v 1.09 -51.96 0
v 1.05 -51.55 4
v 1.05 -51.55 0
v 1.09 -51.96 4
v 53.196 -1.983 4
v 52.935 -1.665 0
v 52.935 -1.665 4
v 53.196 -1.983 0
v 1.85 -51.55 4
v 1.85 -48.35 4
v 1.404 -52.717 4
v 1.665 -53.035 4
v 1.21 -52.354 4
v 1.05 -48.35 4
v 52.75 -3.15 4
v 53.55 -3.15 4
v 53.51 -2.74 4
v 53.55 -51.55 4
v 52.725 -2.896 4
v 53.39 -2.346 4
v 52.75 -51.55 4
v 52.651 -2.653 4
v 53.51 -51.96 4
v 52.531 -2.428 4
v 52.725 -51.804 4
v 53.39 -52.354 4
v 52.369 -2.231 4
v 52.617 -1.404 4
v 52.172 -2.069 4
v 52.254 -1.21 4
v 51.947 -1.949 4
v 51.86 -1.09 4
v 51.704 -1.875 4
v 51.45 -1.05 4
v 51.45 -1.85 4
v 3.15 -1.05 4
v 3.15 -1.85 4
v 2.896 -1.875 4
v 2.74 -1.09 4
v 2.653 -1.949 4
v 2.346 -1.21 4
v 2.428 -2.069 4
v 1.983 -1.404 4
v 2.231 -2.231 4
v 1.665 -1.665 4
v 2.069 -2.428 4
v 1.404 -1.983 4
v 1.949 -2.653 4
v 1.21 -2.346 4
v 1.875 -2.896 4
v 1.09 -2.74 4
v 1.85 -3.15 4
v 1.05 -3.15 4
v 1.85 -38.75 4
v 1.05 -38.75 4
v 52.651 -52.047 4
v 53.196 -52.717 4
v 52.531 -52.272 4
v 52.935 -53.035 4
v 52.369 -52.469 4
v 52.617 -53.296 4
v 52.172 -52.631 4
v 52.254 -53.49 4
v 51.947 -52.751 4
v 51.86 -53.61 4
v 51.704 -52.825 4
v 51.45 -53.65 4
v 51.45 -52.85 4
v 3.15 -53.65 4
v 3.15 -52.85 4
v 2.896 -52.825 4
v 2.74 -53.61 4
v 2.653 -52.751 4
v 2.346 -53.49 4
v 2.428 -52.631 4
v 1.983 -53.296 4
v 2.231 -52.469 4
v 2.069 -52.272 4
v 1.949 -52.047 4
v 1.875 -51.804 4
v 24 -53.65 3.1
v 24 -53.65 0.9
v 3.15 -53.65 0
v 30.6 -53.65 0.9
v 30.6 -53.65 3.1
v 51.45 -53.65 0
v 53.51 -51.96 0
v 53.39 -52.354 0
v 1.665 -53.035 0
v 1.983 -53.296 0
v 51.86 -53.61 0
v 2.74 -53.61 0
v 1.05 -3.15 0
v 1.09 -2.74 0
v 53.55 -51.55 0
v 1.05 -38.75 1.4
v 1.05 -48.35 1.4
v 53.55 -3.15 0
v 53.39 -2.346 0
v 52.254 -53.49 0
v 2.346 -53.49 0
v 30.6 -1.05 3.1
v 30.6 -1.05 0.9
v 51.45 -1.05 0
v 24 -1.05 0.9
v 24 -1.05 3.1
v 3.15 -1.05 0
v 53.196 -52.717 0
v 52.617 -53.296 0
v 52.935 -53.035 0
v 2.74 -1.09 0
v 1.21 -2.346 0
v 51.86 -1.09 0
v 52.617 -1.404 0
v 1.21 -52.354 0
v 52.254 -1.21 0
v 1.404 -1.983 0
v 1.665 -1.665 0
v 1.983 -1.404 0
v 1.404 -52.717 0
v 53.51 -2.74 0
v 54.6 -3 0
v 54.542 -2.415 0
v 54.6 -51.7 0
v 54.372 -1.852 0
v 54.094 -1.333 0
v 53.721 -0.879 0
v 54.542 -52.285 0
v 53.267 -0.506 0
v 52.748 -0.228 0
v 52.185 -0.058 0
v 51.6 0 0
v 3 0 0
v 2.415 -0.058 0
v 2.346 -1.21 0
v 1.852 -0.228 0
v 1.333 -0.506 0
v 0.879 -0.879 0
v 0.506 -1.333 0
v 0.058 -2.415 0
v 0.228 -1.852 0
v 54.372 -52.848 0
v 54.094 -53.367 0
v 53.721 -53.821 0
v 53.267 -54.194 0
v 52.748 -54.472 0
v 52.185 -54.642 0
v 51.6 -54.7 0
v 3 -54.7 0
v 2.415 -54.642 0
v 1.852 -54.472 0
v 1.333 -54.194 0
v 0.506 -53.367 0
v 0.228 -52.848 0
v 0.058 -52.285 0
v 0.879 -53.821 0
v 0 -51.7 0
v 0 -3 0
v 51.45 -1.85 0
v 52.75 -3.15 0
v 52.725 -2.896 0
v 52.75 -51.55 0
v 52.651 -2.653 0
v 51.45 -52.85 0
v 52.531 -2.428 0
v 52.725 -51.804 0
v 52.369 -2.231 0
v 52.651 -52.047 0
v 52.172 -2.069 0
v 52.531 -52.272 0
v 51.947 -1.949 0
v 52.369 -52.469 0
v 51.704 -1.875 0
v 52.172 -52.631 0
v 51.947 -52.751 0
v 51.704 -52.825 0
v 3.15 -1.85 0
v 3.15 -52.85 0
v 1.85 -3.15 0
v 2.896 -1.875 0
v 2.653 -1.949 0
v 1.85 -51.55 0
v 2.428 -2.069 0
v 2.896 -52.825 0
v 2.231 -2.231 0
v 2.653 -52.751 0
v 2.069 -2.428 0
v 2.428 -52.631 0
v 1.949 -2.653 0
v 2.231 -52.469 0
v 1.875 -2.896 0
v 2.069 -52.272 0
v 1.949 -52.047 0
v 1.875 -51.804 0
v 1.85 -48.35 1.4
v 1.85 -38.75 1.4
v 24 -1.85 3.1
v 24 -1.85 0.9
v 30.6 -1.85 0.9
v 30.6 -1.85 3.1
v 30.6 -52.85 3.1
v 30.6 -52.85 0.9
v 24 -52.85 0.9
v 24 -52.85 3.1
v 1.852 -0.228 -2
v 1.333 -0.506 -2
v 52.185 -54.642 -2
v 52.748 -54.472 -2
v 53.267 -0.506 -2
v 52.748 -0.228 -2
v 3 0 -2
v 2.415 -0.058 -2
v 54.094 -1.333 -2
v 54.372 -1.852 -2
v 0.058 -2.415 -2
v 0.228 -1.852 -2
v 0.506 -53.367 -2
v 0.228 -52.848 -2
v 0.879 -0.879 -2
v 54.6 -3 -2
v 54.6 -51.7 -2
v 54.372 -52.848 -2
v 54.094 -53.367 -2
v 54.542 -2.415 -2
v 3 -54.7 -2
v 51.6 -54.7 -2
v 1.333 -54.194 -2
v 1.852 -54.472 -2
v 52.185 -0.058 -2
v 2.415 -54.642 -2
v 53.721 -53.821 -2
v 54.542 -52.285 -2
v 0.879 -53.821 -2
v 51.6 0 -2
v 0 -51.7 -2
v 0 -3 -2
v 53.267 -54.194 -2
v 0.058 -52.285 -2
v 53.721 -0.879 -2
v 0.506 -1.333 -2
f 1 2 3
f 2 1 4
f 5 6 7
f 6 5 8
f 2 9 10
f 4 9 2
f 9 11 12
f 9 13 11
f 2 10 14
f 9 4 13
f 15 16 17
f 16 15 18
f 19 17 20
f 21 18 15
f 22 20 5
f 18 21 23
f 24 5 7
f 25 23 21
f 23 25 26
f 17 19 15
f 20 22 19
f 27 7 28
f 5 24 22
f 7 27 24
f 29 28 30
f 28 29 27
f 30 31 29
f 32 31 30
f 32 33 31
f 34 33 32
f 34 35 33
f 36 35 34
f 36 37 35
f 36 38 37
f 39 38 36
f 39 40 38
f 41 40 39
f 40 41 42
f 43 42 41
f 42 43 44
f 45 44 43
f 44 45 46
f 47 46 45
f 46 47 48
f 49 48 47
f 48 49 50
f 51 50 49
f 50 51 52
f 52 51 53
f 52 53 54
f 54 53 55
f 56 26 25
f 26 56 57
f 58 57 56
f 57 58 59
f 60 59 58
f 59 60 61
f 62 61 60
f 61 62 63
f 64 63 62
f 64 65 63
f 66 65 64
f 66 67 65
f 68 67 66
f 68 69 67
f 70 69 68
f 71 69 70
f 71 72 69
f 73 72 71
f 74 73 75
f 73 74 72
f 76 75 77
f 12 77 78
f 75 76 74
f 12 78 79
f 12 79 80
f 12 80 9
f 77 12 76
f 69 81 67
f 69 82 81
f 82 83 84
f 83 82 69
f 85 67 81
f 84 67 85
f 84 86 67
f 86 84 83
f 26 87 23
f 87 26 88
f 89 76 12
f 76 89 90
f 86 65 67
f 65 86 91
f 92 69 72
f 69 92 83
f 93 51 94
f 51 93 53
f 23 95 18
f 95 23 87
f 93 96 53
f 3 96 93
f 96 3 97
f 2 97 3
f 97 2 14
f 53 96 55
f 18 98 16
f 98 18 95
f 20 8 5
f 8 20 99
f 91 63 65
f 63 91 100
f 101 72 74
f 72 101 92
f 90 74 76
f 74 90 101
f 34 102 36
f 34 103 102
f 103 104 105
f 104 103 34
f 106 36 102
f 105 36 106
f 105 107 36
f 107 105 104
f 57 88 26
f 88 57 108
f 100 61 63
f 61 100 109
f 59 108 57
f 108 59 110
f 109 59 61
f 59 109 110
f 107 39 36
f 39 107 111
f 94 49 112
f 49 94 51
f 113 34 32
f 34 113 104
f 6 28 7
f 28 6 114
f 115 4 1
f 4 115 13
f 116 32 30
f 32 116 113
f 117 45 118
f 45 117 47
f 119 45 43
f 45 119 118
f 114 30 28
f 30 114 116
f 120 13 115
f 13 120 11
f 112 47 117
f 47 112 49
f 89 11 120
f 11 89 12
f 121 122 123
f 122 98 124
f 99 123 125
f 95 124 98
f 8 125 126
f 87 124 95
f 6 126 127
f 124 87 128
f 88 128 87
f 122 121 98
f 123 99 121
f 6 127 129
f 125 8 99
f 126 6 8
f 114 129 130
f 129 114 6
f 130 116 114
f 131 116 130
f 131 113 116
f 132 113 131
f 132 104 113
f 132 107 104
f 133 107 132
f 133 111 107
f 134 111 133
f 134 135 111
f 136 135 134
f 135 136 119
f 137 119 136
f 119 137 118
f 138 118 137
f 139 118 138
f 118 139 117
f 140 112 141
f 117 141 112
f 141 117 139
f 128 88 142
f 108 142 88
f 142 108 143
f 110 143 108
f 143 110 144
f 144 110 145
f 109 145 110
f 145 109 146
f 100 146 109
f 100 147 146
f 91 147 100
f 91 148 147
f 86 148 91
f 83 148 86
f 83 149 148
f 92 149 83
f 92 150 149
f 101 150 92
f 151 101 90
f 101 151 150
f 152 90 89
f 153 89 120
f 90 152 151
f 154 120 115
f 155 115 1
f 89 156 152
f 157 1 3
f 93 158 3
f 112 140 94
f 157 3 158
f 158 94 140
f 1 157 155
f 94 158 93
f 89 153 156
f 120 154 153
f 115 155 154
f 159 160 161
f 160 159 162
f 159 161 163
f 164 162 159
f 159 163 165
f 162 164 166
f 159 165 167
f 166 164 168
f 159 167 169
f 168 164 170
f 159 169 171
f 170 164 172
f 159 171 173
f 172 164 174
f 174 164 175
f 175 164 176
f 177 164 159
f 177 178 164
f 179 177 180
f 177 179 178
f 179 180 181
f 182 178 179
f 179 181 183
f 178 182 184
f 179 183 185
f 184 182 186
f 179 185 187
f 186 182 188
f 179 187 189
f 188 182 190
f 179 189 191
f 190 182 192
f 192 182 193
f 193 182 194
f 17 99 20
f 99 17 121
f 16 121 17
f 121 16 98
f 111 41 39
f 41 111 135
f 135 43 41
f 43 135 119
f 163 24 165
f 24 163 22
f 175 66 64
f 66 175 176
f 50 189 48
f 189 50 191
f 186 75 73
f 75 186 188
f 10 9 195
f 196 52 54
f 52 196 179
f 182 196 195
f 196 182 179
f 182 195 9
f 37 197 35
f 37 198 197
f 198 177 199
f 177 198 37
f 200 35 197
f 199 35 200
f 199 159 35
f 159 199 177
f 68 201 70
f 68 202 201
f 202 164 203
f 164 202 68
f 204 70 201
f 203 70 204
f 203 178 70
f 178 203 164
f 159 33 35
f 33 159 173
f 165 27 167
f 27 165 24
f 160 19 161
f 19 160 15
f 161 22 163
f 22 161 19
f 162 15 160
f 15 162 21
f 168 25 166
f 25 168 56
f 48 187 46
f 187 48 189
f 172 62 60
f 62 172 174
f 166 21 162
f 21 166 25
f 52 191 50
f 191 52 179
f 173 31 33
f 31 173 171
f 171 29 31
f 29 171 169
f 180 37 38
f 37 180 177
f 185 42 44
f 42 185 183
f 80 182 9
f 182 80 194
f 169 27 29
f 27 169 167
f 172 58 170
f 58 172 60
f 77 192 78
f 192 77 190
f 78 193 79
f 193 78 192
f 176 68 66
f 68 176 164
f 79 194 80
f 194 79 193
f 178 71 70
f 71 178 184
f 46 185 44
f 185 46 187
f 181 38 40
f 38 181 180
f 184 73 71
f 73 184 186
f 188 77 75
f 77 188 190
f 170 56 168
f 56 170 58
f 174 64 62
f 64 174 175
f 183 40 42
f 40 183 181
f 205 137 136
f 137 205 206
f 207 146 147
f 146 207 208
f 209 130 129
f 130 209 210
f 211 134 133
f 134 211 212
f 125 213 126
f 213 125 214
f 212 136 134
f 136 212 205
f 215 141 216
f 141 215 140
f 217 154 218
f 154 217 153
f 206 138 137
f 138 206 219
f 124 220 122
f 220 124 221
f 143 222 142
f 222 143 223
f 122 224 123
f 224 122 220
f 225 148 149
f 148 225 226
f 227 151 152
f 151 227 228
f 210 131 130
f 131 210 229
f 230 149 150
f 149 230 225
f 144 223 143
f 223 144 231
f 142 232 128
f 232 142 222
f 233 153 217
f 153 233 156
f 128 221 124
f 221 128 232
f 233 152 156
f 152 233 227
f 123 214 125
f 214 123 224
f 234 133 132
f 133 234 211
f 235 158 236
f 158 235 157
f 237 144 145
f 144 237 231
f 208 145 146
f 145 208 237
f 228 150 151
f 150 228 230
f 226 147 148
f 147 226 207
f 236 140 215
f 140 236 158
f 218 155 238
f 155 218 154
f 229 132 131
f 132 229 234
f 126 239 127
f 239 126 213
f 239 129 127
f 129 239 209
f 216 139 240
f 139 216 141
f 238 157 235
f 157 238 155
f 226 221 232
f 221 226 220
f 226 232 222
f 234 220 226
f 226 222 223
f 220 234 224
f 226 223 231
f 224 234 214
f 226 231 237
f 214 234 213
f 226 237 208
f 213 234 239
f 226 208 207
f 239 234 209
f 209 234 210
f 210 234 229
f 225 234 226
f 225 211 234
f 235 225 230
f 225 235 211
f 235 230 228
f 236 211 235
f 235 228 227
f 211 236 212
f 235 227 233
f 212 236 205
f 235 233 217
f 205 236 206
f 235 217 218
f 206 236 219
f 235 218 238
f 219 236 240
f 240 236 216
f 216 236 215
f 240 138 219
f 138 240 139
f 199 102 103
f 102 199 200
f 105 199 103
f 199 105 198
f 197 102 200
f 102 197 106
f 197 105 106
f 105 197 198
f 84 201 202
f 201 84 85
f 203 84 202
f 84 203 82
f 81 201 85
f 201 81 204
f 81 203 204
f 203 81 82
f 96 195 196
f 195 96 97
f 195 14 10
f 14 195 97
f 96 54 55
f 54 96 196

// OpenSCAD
// Il coperchio visto da sotto: il labbro, le due finestre in cui entrano
// i dentini della battuta e la luce per la USB-C.
//
// E' la faccia che nessun'altra vista mostra, ed e' quella dove sta la
// ritenuta: dall'alto il coperchio e' una piastra liscia, e chi guarda
// solo le altre viste non ha modo di sapere che cosa lo tiene chiuso a
// testa in giu'.
//
// Il pezzo e' capovolto invece di essere guardato dal basso spostando la
// camera, per la stessa ragione di case-sotto.scad: la luce di OpenSCAD
// e' fissa nel mondo e viene dall'alto, e da sotto il pezzo esce una
// faccia uniformemente scura.
//
// 'use' e non 'include': qui servono solo i moduli, e con include il
// codice in coda a case.scad emetterebbe anche i pezzi diritti.

use <../case.scad>

rotate([180, 0, 0]) coperchio();
